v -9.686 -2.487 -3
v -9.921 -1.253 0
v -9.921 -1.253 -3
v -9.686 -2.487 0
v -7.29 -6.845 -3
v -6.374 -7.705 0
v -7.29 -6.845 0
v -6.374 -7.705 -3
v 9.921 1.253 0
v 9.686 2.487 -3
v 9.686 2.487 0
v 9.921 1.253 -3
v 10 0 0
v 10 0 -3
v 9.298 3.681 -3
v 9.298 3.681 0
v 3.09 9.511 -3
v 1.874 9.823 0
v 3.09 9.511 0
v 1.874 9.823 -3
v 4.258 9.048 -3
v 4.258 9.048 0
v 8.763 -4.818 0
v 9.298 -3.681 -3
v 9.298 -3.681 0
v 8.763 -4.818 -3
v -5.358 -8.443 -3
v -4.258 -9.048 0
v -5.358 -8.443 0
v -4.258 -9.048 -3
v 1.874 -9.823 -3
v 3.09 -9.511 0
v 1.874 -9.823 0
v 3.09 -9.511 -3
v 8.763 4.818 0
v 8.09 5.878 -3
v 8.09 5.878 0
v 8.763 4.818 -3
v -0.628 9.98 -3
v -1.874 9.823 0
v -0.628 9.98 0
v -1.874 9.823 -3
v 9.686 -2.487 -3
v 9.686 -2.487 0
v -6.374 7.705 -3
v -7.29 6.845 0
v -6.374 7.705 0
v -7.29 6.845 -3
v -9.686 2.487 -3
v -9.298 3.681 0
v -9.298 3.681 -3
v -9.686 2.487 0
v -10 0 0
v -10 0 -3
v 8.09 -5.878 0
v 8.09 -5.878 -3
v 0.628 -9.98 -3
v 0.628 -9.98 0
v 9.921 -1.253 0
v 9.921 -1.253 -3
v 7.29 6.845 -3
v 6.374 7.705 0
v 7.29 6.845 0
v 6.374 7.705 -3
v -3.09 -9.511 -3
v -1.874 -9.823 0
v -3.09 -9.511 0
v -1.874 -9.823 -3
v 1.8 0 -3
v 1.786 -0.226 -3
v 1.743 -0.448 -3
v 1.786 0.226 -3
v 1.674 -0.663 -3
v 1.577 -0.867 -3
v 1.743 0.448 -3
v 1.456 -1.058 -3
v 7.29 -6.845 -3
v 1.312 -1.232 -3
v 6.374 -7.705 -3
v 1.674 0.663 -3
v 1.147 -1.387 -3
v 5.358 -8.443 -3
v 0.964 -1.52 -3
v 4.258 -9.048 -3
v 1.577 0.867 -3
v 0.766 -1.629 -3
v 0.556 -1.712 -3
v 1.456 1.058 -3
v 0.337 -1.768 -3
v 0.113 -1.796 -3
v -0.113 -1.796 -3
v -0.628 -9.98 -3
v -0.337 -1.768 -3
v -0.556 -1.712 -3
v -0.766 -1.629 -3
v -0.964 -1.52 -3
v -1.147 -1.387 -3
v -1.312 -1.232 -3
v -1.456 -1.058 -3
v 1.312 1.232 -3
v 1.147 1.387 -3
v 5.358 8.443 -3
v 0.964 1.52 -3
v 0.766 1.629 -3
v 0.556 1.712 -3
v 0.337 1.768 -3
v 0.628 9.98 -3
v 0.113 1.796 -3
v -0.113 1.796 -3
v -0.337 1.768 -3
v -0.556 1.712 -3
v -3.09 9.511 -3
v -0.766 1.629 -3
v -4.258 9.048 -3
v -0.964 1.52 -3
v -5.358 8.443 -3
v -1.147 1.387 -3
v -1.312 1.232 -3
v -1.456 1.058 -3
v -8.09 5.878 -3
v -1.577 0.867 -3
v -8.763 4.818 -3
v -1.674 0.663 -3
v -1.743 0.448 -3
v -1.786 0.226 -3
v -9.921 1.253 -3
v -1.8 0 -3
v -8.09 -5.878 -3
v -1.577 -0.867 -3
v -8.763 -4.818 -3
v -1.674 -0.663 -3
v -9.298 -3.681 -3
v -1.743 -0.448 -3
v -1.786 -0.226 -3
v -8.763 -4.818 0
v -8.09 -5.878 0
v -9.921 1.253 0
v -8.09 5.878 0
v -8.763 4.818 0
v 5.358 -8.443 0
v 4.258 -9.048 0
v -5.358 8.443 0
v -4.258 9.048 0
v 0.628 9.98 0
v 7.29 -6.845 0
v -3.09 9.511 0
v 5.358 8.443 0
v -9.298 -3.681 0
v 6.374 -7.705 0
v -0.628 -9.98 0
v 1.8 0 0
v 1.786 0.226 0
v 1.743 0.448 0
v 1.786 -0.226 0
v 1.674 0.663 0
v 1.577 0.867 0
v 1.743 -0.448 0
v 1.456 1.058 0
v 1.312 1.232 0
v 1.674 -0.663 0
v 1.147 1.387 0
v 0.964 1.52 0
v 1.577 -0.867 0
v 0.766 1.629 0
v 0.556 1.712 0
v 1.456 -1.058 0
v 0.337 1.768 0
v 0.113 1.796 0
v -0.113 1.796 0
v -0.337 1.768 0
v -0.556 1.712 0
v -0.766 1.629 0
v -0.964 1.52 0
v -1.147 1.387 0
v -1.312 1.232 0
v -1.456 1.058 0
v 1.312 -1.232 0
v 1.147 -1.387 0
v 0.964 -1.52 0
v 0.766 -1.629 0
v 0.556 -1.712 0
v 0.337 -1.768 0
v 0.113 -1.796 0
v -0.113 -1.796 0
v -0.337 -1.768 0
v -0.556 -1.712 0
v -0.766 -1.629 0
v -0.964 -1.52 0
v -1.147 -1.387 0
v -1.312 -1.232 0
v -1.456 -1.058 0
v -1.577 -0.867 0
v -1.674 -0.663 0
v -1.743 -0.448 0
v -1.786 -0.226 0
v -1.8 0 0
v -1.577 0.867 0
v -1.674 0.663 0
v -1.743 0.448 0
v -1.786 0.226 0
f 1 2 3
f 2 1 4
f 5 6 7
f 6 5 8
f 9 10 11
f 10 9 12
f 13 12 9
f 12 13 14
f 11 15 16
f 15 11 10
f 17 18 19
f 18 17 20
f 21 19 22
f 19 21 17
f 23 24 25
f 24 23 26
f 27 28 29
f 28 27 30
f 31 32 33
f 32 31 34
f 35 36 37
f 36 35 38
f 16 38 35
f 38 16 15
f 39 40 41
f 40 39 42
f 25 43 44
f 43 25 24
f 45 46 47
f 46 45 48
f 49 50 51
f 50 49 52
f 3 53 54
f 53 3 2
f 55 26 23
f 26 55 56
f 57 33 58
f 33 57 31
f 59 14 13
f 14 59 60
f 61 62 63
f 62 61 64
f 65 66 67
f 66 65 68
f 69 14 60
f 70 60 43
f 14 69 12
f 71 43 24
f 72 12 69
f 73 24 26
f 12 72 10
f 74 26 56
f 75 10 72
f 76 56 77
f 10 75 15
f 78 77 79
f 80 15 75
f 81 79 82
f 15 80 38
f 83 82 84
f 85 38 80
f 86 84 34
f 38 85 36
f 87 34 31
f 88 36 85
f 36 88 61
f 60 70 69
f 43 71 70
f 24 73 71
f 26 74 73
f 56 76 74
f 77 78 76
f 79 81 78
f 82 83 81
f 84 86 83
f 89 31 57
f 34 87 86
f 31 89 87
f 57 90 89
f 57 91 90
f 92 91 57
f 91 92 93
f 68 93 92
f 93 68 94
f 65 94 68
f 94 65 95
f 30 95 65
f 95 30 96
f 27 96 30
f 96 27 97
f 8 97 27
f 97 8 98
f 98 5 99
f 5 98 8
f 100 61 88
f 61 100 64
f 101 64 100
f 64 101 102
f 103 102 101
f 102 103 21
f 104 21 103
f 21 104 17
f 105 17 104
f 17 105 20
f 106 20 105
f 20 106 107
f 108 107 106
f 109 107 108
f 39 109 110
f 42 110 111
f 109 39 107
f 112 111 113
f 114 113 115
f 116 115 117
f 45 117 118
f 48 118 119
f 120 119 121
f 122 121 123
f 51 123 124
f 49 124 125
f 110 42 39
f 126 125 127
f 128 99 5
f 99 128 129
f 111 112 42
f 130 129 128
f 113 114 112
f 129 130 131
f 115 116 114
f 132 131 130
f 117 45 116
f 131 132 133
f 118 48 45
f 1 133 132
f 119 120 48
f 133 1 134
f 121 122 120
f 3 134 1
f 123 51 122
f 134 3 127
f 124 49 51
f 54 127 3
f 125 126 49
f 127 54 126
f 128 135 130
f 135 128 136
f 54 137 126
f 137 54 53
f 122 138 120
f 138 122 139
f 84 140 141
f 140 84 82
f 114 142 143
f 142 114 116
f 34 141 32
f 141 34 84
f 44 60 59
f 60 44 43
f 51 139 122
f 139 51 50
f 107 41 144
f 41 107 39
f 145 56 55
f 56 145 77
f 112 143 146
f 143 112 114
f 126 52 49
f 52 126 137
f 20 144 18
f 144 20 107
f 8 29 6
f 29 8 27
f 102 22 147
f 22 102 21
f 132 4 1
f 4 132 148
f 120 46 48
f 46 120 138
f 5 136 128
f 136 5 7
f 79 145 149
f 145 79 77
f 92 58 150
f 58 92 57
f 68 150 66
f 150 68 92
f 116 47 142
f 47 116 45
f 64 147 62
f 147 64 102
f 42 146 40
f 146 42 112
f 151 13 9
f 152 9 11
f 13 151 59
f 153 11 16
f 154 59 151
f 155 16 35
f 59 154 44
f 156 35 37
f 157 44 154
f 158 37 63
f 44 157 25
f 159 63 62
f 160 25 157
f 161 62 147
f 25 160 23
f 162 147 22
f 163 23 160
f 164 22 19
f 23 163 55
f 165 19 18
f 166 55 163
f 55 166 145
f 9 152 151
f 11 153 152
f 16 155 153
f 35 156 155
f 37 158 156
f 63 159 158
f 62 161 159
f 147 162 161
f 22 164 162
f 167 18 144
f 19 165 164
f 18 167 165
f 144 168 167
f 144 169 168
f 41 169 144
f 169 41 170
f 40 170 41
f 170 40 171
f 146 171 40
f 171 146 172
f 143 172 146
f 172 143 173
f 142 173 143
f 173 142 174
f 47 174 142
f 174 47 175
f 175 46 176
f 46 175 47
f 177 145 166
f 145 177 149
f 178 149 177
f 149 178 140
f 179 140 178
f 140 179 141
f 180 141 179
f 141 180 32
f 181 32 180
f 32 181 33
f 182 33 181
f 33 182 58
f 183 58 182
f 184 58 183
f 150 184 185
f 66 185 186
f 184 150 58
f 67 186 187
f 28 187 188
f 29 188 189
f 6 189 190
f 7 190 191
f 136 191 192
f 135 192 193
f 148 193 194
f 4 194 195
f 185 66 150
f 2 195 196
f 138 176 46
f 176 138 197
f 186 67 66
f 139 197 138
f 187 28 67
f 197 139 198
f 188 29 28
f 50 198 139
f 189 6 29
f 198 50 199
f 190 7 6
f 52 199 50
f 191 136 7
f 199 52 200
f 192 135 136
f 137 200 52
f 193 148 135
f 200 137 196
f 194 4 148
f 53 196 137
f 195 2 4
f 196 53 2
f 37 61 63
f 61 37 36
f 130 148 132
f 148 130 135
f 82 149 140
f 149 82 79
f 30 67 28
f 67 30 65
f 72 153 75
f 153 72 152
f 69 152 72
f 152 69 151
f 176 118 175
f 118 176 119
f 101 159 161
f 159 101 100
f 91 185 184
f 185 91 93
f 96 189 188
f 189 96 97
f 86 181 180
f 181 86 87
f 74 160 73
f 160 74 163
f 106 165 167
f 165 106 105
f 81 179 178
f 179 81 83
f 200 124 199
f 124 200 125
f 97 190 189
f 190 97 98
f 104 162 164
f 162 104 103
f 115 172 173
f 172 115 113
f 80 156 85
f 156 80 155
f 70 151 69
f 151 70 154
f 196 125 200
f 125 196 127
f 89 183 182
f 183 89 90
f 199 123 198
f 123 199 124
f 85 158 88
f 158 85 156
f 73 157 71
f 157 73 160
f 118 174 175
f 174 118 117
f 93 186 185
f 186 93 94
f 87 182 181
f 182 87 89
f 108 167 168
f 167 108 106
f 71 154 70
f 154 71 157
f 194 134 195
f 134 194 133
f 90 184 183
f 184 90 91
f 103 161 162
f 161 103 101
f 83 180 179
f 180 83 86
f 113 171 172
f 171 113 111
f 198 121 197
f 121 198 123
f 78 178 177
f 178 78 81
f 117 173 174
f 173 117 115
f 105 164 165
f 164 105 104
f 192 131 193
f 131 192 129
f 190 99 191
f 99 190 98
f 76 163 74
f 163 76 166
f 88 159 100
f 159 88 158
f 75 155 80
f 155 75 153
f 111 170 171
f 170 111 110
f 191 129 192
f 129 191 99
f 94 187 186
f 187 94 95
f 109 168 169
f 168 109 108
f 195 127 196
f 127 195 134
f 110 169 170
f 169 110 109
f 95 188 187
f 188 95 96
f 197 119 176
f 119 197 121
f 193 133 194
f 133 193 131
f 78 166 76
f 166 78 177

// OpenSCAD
$fn = 50;


difference() {
	union() {
		translate(v = [0, 0, -3.0000000000]) {
			cylinder(h = 3, r = 10.0000000000);
		}
		cylinder(h = 0, r = 19.0000000000);
	}
	union() {
		#translate(v = [0, 0, -3]) {
			cylinder(h = 3, r = 1.8000000000);
		}
	}
}
